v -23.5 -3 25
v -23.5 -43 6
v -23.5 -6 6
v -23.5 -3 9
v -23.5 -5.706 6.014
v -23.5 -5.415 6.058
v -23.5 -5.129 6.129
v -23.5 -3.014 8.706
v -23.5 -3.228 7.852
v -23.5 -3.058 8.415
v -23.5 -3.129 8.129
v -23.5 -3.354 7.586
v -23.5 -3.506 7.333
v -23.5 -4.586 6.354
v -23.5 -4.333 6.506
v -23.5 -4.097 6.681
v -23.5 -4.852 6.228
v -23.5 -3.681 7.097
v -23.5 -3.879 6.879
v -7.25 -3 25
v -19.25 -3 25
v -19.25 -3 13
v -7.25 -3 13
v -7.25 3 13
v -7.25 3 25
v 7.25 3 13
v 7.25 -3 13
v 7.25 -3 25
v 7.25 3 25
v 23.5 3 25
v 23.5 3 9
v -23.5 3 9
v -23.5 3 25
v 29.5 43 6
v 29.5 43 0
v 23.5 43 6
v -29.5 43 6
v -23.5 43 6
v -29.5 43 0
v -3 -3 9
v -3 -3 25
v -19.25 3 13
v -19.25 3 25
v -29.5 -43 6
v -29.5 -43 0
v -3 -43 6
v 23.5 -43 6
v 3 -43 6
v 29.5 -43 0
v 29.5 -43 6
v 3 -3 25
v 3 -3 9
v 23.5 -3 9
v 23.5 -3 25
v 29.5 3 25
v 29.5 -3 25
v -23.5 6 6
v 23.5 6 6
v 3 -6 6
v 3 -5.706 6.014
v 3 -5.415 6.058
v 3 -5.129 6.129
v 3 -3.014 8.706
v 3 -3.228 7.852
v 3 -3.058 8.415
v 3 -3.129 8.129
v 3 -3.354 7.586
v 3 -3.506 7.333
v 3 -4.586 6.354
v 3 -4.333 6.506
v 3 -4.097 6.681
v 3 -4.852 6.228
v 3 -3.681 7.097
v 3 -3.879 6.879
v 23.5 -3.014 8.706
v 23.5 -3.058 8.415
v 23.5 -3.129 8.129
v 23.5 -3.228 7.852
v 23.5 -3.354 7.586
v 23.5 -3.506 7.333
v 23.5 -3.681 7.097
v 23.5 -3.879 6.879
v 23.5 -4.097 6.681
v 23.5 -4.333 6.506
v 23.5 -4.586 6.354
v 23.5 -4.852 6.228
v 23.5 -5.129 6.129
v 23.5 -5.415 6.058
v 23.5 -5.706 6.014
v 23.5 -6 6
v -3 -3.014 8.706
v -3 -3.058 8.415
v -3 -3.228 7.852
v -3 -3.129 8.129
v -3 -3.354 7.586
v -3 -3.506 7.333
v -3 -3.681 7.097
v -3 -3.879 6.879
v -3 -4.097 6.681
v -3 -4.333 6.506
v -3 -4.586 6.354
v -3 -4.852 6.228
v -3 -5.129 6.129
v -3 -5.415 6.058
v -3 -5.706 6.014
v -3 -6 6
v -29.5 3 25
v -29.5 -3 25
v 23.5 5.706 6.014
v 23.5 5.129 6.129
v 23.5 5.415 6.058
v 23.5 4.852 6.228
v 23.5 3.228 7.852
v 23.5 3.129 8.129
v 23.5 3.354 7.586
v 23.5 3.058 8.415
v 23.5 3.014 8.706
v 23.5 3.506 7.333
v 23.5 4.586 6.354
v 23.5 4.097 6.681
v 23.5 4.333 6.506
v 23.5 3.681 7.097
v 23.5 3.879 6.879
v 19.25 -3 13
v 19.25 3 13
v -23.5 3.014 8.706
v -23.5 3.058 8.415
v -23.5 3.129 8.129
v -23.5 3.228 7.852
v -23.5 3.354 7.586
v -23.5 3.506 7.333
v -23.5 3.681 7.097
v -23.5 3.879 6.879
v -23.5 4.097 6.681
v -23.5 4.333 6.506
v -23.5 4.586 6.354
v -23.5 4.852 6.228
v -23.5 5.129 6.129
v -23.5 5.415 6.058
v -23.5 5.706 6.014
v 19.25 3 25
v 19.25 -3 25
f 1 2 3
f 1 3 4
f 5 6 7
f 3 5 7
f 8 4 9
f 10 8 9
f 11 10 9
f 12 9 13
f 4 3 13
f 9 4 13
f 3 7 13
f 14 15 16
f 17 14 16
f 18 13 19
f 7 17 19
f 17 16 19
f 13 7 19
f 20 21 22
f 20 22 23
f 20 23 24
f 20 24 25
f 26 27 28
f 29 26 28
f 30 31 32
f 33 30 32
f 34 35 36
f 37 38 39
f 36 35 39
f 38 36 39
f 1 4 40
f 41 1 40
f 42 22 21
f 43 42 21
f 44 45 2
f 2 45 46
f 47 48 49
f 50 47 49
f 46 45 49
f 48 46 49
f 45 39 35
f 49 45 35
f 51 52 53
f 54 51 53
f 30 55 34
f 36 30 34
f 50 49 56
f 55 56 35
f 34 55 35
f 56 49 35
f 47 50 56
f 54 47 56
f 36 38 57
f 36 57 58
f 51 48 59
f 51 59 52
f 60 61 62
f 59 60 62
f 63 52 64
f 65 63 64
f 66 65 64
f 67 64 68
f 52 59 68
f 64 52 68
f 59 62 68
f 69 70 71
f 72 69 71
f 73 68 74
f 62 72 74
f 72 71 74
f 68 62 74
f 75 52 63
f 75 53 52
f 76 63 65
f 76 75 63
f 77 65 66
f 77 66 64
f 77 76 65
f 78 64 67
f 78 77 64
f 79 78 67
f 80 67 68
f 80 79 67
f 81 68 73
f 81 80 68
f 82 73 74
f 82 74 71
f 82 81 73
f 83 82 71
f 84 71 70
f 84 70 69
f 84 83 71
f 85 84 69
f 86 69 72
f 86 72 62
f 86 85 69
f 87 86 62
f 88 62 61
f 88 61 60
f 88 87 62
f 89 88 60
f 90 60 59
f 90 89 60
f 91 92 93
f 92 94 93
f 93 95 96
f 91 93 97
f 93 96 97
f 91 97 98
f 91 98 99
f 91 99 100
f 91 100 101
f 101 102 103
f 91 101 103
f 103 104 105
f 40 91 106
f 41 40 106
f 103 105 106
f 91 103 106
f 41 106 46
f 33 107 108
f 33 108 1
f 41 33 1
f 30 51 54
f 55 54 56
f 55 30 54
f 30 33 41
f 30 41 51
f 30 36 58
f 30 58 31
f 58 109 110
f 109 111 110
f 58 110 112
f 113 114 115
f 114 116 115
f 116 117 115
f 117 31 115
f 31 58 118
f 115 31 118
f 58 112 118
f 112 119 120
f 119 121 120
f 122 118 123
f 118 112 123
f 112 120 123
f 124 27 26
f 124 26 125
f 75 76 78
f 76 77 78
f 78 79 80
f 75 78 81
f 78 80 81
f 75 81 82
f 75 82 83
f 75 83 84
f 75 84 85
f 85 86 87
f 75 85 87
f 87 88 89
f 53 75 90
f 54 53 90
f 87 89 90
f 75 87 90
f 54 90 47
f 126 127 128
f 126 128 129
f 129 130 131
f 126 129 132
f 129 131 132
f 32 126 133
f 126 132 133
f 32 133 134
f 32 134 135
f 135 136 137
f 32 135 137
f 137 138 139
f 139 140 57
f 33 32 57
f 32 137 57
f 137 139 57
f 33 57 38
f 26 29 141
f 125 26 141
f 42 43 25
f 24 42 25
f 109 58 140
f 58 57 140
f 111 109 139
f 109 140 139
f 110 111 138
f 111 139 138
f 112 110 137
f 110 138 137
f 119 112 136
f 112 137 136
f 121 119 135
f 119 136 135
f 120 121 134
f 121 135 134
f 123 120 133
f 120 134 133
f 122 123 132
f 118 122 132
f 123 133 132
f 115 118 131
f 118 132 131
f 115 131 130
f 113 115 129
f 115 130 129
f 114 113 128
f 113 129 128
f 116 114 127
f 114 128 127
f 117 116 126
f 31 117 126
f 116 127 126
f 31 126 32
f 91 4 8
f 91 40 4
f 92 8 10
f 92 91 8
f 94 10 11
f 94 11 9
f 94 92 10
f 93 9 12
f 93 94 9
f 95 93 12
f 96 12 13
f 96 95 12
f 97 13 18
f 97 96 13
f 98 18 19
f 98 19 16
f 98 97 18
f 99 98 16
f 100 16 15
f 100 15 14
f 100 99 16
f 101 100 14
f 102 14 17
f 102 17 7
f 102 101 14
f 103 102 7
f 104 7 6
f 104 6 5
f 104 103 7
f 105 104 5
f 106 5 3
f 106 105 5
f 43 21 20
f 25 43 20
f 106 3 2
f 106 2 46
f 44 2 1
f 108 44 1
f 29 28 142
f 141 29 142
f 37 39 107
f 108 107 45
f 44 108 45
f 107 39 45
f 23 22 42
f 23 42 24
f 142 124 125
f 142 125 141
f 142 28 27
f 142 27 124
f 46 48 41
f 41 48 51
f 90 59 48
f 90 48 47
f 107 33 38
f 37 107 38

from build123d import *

# Parameters (mm, degrees)
F0_W     = 59
F0_H     = 86
F1_DEPTH = 6
F3_DEPTH = 19
F5_DEPTH = 59.001
F6_W     = 12
F6_H     = 12
F7_DEPTH = 6
F8_R     = 3


with BuildPart() as f1:
    # F0 (on Top) → F1 (new body)
    with BuildSketch(Plane.XY):
        Rectangle(F0_W, F0_H)
    extrude(amount=F1_DEPTH)

    # F2 (on face) → F3 (join)
    with BuildSketch(Plane.XY.offset(6)):
        Polygon((-23.5, 43), (-29.5, 43), (-29.5, -43), (-23.5, -43), (-23.5, -3), (-3, -3), (-3, -43), (3, -43), (3, -3), (23.5, -3), (23.5, -43), (29.5, -43), (29.5, 43), (23.5, 43), (23.5, 3), (-23.5, 3), align=None)
    extrude(amount=F3_DEPTH)

    # F4 (on face) → F5 (cut, through all)
    with BuildSketch(Plane.YZ.offset(29.5)):
        Polygon((-43, 25), (-43, 6), (-3, 25), align=None)
        Polygon((43, 25), (3, 25), (43, 6), align=None)
    extrude(amount=-F5_DEPTH, mode=Mode.SUBTRACT)

    # F8
    f8_edges = [f1.edges().sort_by_distance(p)[0] for p in [
        (-13.25, -3, 6),
        (13.25, -3, 6),
        (0, 3, 6),
    ]]
    fillet(f8_edges, radius=F8_R)


with BuildPart() as f7:
    # F6 (on face) → F7 (new body)
    with BuildSketch(Plane.XZ.offset(3)):
        with Locations((-13.25, 19)):
            Rectangle(F6_W, F6_H)
        with Locations((13.25, 19)):
            Rectangle(F6_W, F6_H)
    extrude(amount=-F7_DEPTH)


solid = Compound([f1.part, f7.part])
